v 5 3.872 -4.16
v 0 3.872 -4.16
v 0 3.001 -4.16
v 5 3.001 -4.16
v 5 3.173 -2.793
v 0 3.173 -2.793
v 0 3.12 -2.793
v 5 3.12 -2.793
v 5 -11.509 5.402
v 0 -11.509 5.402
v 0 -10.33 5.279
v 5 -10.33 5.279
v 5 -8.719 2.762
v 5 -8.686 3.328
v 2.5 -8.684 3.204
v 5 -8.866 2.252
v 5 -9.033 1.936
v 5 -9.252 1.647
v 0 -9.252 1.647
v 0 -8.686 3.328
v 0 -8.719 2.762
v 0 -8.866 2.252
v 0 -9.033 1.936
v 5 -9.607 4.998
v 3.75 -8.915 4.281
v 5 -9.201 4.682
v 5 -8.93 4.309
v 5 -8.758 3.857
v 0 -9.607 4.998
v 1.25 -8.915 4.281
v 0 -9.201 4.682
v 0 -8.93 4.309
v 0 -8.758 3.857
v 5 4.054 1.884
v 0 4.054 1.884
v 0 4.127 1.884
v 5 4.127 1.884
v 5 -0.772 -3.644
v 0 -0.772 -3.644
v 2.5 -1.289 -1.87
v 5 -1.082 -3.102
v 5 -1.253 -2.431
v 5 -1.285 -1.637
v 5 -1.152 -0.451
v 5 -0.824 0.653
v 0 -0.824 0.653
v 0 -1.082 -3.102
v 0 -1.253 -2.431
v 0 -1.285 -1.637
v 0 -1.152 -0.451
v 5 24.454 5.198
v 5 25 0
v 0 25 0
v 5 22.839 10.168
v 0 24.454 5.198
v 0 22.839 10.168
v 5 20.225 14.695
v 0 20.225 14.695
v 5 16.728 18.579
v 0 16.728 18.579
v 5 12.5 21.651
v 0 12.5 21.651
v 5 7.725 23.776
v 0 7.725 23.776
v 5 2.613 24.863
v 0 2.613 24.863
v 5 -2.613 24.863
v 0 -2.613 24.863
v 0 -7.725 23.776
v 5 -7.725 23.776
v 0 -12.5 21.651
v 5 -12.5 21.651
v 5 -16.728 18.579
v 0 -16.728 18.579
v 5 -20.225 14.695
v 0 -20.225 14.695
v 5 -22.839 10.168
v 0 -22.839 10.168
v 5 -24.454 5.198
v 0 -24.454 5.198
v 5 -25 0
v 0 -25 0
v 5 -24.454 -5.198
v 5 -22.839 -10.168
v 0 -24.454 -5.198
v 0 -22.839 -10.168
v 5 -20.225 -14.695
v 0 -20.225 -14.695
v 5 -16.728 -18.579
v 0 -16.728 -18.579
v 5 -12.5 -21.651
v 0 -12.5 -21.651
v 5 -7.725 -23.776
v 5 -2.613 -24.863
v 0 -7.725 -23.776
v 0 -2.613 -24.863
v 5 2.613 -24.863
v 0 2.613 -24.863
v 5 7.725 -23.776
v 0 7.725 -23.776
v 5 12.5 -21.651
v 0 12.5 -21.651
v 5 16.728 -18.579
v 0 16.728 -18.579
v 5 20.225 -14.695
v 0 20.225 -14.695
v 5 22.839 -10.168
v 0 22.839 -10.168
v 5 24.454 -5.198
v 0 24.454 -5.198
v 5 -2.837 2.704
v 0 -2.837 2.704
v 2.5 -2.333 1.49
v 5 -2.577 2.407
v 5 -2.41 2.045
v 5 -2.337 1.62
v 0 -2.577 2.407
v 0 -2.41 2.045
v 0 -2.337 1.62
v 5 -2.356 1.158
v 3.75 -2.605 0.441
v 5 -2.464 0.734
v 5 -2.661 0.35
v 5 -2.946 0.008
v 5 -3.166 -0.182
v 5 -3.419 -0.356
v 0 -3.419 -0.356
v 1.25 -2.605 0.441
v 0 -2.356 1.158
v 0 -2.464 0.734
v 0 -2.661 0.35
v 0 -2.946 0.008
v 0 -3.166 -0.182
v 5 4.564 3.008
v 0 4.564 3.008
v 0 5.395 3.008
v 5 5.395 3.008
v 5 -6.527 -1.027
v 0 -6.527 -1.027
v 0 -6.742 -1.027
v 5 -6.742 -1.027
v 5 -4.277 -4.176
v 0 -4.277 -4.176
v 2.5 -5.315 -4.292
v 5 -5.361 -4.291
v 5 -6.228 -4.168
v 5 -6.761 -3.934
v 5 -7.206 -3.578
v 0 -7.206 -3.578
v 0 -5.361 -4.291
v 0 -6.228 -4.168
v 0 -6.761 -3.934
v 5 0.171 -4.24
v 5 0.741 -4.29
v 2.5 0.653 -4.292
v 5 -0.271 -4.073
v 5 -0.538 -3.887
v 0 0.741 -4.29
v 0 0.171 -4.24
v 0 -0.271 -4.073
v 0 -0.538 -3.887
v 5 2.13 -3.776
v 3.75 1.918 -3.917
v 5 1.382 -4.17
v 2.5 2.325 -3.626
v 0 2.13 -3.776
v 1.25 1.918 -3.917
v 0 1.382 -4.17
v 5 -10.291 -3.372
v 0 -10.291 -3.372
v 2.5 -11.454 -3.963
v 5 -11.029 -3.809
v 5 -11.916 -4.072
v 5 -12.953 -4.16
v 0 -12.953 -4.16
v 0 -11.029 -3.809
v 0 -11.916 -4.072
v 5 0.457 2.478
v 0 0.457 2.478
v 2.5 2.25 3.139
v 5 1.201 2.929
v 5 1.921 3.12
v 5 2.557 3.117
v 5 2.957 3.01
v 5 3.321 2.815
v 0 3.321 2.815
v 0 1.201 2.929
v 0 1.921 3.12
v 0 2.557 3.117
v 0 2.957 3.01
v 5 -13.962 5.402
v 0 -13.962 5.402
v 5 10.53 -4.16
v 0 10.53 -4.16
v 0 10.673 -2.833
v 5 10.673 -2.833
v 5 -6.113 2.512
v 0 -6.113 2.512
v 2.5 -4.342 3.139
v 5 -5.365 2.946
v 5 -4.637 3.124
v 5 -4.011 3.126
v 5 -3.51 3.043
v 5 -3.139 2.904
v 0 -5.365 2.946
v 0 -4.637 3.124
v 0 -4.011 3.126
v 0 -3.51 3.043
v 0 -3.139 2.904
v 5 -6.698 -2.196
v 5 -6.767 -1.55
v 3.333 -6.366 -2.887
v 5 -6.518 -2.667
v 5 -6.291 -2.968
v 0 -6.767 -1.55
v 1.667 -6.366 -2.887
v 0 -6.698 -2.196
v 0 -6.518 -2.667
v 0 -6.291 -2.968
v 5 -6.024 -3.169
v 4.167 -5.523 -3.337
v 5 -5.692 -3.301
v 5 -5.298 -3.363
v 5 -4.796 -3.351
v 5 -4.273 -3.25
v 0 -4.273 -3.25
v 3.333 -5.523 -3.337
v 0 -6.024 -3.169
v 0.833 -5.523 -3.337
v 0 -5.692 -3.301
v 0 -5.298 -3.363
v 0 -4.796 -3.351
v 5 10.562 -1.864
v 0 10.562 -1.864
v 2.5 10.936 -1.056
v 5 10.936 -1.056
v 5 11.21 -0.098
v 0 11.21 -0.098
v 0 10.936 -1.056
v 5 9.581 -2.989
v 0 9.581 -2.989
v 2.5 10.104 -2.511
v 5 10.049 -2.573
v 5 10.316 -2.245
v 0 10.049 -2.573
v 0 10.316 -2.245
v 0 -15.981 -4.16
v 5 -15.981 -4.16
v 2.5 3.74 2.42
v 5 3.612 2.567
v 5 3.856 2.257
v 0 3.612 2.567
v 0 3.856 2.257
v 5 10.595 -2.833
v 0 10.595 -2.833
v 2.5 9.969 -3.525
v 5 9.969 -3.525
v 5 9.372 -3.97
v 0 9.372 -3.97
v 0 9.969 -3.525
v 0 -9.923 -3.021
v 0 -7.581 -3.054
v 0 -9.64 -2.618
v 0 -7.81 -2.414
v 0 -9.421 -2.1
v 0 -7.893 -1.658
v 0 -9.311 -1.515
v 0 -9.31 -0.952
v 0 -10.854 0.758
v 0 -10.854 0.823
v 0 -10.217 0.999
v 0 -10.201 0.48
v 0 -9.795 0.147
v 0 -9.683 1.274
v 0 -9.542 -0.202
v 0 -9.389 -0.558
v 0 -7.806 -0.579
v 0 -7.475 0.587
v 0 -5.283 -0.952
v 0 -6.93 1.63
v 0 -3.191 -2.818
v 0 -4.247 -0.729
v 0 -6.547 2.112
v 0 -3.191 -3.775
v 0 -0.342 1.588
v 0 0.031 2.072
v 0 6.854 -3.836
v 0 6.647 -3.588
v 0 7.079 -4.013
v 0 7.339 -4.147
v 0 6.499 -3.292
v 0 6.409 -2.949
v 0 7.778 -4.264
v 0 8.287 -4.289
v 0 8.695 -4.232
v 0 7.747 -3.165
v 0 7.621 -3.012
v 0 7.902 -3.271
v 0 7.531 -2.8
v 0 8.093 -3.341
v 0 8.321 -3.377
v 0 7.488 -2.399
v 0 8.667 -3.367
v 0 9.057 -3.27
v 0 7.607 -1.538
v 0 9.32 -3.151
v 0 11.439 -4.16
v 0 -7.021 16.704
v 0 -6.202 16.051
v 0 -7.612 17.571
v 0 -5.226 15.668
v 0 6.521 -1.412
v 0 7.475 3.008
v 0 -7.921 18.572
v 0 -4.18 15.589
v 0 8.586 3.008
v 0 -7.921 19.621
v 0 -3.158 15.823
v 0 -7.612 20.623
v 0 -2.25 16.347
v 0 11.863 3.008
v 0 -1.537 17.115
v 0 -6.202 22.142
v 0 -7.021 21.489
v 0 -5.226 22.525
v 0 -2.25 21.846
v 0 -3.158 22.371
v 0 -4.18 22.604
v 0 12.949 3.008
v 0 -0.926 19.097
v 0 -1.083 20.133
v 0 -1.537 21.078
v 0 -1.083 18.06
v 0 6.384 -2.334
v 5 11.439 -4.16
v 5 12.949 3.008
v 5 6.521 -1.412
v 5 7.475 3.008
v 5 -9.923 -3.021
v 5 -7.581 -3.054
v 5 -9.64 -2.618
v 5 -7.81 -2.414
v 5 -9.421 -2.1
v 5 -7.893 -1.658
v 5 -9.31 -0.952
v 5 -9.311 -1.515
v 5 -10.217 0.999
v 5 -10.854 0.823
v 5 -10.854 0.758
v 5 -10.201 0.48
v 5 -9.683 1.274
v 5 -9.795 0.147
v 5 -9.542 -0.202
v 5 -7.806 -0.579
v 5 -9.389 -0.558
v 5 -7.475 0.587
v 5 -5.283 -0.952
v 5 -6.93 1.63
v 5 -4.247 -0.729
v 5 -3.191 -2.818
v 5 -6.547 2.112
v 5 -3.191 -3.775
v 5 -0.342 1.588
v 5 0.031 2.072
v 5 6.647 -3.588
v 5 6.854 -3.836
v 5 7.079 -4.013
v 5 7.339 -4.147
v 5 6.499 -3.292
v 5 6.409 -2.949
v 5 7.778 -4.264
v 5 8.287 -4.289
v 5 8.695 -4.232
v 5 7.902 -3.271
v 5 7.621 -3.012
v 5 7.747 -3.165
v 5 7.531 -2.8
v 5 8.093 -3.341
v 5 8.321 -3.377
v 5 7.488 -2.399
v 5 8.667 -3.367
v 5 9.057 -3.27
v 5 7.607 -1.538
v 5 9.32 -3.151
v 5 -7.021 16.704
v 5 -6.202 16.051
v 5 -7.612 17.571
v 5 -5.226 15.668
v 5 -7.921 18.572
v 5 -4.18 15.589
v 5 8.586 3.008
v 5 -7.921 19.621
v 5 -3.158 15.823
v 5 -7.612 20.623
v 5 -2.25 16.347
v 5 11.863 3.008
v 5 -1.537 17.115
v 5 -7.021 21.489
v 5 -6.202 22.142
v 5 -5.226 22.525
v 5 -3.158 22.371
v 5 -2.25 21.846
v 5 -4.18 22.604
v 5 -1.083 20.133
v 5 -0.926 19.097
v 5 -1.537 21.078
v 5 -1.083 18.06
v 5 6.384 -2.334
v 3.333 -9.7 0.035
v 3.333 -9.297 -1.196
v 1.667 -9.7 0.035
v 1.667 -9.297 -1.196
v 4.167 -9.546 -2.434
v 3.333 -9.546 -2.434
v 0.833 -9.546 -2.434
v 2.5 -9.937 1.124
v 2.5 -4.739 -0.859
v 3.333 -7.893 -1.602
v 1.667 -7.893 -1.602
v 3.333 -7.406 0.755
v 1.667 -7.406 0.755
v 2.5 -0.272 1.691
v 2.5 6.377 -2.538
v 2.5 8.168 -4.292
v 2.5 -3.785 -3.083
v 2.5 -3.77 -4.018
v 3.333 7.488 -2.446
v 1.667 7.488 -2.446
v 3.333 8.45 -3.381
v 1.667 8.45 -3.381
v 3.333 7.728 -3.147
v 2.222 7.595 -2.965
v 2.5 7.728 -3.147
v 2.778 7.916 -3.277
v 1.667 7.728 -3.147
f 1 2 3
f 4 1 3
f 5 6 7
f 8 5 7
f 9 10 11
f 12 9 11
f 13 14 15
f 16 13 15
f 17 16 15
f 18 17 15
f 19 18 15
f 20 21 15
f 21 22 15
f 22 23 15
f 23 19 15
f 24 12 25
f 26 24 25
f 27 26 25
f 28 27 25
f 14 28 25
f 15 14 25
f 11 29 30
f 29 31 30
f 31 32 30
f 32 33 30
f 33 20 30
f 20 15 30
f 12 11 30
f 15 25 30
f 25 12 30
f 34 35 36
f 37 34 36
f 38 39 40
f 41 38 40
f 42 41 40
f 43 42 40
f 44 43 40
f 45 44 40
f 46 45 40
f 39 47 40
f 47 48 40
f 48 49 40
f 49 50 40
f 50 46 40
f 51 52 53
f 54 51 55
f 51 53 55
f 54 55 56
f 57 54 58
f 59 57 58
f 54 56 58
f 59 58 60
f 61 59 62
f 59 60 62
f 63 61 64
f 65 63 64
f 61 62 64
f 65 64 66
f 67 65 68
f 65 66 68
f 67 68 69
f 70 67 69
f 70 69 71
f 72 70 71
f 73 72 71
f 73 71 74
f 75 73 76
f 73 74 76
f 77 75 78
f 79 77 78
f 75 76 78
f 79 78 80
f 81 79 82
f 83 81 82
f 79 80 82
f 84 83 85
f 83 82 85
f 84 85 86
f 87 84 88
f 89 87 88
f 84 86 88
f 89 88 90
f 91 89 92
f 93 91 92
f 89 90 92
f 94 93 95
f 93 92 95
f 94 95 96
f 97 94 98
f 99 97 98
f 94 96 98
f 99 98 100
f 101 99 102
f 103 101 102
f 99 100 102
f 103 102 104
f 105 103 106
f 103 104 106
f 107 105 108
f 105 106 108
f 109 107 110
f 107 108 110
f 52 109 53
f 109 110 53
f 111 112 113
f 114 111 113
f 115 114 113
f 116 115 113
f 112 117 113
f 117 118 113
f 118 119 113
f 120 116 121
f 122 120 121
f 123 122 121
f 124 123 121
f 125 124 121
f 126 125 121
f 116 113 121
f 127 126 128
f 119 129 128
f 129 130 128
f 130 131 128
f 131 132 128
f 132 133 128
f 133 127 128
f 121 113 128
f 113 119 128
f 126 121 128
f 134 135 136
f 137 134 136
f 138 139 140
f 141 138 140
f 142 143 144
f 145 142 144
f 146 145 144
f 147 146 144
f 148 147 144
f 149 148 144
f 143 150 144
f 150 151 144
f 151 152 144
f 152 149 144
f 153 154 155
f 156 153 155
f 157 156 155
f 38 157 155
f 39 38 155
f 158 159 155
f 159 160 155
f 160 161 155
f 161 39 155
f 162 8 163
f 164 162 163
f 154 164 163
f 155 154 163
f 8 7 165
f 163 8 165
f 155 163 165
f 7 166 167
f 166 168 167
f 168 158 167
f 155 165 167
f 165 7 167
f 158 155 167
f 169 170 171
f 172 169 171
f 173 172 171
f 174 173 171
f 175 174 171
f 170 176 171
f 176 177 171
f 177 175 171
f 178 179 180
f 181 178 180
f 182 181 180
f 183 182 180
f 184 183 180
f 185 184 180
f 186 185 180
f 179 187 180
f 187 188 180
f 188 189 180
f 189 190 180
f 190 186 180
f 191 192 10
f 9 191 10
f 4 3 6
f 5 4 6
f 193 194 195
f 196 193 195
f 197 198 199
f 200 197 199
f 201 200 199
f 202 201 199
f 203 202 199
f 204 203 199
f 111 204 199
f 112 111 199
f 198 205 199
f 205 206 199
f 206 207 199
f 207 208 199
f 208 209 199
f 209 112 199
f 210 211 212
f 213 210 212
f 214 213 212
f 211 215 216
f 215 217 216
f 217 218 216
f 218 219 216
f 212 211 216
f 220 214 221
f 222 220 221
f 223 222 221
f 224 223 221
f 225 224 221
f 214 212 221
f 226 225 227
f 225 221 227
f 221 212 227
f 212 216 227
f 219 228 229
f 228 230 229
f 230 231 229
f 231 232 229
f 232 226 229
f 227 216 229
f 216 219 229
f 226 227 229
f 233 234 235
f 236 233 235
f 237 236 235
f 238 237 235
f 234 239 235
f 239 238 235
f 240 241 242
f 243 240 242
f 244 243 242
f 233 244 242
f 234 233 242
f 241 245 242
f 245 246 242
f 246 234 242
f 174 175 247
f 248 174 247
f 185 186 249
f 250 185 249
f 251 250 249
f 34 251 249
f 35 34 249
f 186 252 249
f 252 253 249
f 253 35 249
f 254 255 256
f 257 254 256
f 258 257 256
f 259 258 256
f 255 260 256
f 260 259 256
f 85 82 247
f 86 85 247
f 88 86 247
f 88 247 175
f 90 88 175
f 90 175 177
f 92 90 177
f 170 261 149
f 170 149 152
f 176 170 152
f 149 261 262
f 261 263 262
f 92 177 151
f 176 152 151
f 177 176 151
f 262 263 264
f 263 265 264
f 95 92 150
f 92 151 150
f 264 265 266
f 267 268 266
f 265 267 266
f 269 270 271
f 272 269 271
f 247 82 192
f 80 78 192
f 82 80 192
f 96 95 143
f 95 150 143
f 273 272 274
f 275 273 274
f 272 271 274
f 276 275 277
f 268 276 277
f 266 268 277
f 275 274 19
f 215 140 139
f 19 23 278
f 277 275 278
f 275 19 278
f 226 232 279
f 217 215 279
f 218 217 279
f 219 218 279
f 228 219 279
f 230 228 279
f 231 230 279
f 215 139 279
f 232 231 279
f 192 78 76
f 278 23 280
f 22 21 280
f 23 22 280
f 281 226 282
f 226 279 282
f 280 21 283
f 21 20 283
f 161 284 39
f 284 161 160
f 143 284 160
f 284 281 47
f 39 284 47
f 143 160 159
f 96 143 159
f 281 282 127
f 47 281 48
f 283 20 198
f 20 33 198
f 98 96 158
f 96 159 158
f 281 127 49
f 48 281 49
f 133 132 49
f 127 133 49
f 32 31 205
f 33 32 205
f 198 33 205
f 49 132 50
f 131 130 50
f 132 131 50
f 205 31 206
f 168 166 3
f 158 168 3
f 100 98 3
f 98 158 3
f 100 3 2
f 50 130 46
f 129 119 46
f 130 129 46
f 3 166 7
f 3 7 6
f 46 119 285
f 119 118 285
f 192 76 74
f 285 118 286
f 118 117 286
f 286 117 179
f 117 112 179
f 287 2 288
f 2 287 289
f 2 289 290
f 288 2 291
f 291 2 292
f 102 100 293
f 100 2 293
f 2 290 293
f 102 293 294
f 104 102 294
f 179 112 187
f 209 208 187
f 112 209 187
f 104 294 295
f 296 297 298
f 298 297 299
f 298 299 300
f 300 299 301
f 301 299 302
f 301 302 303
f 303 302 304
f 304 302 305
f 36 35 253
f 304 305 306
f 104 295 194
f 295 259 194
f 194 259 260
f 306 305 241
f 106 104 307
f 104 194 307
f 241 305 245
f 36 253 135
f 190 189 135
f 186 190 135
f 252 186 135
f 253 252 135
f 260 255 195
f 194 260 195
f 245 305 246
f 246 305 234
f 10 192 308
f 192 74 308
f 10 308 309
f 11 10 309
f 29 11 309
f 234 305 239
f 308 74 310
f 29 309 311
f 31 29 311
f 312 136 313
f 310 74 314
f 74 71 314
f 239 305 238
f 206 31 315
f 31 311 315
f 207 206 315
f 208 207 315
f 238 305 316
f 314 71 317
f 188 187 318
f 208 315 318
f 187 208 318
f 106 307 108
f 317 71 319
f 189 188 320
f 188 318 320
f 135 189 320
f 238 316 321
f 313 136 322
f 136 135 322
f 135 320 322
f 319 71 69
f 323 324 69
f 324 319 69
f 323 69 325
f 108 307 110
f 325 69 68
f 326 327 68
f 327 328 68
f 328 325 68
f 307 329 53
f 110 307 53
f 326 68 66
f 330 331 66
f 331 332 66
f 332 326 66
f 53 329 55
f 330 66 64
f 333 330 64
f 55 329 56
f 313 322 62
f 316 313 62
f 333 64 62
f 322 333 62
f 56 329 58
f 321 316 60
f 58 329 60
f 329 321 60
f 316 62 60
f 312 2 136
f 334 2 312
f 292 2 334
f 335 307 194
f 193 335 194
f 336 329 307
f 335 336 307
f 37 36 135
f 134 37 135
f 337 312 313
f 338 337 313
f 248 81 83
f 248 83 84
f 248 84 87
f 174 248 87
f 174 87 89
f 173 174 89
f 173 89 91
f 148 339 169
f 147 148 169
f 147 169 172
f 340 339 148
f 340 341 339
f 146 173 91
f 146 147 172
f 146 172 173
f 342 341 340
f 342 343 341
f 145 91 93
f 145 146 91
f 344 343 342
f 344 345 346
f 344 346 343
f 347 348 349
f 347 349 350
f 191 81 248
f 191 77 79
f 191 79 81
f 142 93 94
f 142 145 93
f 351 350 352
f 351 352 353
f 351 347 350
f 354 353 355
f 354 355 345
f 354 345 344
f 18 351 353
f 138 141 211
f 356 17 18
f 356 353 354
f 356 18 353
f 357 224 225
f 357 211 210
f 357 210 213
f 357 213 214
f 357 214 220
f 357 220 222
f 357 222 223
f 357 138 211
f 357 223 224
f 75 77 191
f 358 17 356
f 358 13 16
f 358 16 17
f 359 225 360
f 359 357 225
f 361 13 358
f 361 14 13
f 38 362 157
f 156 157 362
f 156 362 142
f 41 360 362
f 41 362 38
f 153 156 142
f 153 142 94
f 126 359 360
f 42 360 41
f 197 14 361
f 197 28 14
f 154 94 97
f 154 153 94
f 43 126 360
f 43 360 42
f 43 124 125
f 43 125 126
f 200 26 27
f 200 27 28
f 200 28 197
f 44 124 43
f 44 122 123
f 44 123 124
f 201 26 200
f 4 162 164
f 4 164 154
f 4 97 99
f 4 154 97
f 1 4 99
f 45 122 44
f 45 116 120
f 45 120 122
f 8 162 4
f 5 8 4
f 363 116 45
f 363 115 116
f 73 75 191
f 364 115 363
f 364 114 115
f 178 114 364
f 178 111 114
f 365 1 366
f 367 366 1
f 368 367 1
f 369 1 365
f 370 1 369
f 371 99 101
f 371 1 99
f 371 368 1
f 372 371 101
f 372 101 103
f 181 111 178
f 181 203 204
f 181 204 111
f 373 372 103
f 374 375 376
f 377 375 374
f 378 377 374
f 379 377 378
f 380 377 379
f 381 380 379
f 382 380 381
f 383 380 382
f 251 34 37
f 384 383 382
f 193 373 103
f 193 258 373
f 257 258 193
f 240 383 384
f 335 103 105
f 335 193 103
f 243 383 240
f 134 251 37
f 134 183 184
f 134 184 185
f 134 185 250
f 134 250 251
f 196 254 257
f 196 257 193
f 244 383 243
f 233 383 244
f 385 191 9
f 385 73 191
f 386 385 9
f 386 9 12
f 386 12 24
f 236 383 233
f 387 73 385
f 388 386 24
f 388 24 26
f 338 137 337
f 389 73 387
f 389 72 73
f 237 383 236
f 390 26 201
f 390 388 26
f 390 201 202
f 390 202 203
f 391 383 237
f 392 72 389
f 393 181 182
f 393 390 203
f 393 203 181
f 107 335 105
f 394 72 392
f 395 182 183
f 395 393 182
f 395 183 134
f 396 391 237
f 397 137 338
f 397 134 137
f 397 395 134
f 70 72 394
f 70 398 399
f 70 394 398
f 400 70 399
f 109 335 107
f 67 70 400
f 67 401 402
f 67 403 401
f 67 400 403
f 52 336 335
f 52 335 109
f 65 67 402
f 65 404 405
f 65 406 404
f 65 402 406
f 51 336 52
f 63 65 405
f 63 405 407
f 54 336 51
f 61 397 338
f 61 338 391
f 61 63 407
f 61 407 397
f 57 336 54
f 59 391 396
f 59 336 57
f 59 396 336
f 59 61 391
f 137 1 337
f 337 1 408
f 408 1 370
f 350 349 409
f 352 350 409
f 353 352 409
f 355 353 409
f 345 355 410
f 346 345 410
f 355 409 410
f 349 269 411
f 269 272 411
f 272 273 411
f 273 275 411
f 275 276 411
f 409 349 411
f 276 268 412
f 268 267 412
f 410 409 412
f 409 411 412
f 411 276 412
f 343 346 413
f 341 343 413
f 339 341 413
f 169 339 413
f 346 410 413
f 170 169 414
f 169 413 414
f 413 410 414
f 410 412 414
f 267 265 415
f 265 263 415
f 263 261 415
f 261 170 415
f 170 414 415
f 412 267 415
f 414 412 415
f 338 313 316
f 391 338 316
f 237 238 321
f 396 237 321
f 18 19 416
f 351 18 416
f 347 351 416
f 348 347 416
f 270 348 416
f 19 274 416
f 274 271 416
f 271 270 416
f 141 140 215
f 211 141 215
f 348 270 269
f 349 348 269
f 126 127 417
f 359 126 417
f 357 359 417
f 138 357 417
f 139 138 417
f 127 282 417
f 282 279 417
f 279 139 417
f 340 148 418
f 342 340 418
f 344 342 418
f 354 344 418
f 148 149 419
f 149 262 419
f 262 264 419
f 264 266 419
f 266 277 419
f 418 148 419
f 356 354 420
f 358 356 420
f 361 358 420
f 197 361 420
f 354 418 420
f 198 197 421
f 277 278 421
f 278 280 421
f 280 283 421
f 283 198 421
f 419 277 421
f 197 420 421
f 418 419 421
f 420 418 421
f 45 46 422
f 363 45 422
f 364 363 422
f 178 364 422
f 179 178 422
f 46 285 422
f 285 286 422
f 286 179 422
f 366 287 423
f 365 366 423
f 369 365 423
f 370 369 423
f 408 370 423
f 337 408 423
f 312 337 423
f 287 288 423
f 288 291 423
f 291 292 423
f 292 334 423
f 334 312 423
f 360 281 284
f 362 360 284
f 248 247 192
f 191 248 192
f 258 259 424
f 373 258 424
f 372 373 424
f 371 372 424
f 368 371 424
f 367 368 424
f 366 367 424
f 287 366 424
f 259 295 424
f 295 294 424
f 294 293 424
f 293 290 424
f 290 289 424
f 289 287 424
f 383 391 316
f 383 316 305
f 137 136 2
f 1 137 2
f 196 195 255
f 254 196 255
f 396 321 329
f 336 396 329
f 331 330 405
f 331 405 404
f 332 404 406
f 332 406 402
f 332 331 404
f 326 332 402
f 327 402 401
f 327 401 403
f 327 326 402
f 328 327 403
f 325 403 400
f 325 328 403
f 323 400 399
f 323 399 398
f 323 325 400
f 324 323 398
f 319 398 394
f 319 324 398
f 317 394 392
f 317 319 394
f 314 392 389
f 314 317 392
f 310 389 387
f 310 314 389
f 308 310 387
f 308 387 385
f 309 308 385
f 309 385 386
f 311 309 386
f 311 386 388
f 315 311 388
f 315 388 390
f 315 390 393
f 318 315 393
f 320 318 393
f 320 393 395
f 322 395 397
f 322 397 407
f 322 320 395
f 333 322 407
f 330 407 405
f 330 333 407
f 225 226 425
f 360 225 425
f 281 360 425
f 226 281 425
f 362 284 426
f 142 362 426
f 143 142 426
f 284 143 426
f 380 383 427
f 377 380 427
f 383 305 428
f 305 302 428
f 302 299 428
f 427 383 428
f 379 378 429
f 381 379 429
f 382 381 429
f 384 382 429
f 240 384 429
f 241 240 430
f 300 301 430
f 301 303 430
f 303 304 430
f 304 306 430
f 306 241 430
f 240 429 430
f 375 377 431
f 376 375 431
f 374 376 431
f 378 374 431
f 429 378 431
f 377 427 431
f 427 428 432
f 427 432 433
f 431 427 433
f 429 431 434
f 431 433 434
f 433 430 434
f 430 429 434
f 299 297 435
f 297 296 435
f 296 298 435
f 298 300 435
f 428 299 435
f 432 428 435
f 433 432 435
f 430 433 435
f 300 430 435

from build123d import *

# Parameters (mm, degrees)
F0_R     = 25
F0_R_2   = 3.517009594
F1_DEPTH = 5


with BuildPart() as f1:
    # F0 (on Right) → F1 (new body)
    with BuildSketch(Plane.YZ):
        Circle(F0_R)
        with BuildLine():
            add(Edge.make_bspline(
                [(-4.2770959996, -4.1764053417), (-4.7479386555, -4.2915002132), (-5.3150424766, -4.2915002132)],
                knots=[0, 0, 0, 1, 1, 1], degree=2))
            add(Edge.make_bspline(
                [(-5.3150424766, -4.2915002132), (-6.5183070416, -4.2915002132), (-7.2057373192, -3.5779120103)],
                knots=[0, 0, 0, 1, 1, 1], degree=2))
            add(Edge.make_bspline(
                [(-7.2057373192, -3.5779120103), (-7.8931675968, -2.8643238073), (-7.8931675968, -1.6024654896)],
                knots=[0, 0, 0, 1, 1, 1], degree=2))
            add(Edge.make_bspline(
                [(-7.8931675968, -1.6024654896), (-7.8931675968, -0.3740893162), (-7.4055838687, 0.7548867409)],
                knots=[0, 0, 0, 1, 1, 1], degree=2))
            add(Edge.make_bspline(
                [(-7.4055838687, 0.7548867409), (-6.9180001406, 1.883862798), (-6.1133823575, 2.5116530059)],
                knots=[0, 0, 0, 1, 1, 1], degree=2))
            add(Edge.make_bspline(
                [(-6.1133823575, 2.5116530059), (-5.3087645745, 3.1394432137), (-4.3419676544, 3.1394432137)],
                knots=[0, 0, 0, 1, 1, 1], degree=2))
            add(Edge.make_bspline(
                [(-4.3419676544, 3.1394432137), (-3.3416885899, 3.1394432137), (-2.8373637896, 2.7041753363)],
                knots=[0, 0, 0, 1, 1, 1], degree=2))
            add(Edge.make_bspline(
                [(-2.8373637896, 2.7041753363), (-2.3330389893, 2.2689074588), (-2.3330389893, 1.4904476011)],
                knots=[0, 0, 0, 1, 1, 1], degree=2))
            add(Edge.make_bspline(
                [(-2.3330389893, 1.4904476011), (-2.3330389893, 0.3143872784), (-3.4191160489, -0.356301927)],
                knots=[0, 0, 0, 1, 1, 1], degree=2))
            add(Edge.make_bspline(
                [(-3.4191160489, -0.356301927), (-4.5051931084, -1.0269911324), (-6.5266775777, -1.0269911324)],
                knots=[0, 0, 0, 1, 1, 1], degree=2))
            Line((-6.5266775777, -1.0269911324), (-6.7422188824, -1.0269911324))
            Line((-6.7422188824, -1.0269911324), (-6.7673304907, -1.5501496389))
            add(Edge.make_bspline(
                [(-6.7673304907, -1.5501496389), (-6.7673304907, -2.4060369556), (-6.3655447577, -2.8873427816)],
                knots=[0, 0, 0, 1, 1, 1], degree=2))
            add(Edge.make_bspline(
                [(-6.3655447577, -2.8873427816), (-5.9637590247, -3.3686486076), (-5.1204275121, -3.3686486076)],
                knots=[0, 0, 0, 1, 1, 1], degree=2))
            add(Edge.make_bspline(
                [(-5.1204275121, -3.3686486076), (-4.708178609, -3.3686486076), (-4.2729107315, -3.2504147852)],
                knots=[0, 0, 0, 1, 1, 1], degree=2))
            add(Edge.make_bspline(
                [(-4.2729107315, -3.2504147852), (-3.8376428541, -3.1321809627), (-3.19101894, -2.8182858588)],
                knots=[0, 0, 0, 1, 1, 1], degree=2))
            Line((-3.19101894, -2.8182858588), (-3.19101894, -3.7746196087))
            add(Edge.make_bspline(
                [(-3.19101894, -3.7746196087), (-3.8062533437, -4.0613104703), (-4.2770959996, -4.1764053417)],
                knots=[0, 0, 0, 1, 1, 1], degree=2))
        make_face(mode=Mode.SUBTRACT)
        with BuildLine():
            add(Edge.make_bspline(
                [(0.4574884846, 2.4781708614), (1.2746620718, 3.1394432137), (2.249829528, 3.1394432137)],
                knots=[0, 0, 0, 1, 1, 1], degree=2))
            add(Edge.make_bspline(
                [(2.249829528, 3.1394432137), (2.8504154935, 3.1394432137), (3.3212581494, 2.8150849397)],
                knots=[0, 0, 0, 1, 1, 1], degree=2))
            add(Edge.make_bspline(
                [(3.3212581494, 2.8150849397), (3.7921008053, 2.4907266656), (4.0536800586, 1.883862798)],
                knots=[0, 0, 0, 1, 1, 1], degree=2))
            Line((4.0536800586, 1.883862798), (4.1269222495, 1.883862798))
            Line((4.1269222495, 1.883862798), (4.5642827609, 3.0076072701))
            Line((4.5642827609, 3.0076072701), (5.3950584693, 3.0076072701))
            Line((5.3950584693, 3.0076072701), (3.8716208983, -4.1596642695))
            Line((3.8716208983, -4.1596642695), (3.0010851434, -4.1596642695))
            Line((3.0010851434, -4.1596642695), (3.1726811335, -2.7931742505))
            Line((3.1726811335, -2.7931742505), (3.1203652829, -2.7931742505))
            add(Edge.make_bspline(
                [(3.1203652829, -2.7931742505), (1.9484902282, -4.2915002132), (0.653149766, -4.2915002132)],
                knots=[0, 0, 0, 1, 1, 1], degree=2))
            add(Edge.make_bspline(
                [(0.653149766, -4.2915002132), (-0.2550534013, -4.2915002132), (-0.7719340058, -3.6438299821)],
                knots=[0, 0, 0, 1, 1, 1], degree=2))
            add(Edge.make_bspline(
                [(-0.7719340058, -3.6438299821), (-1.2888146102, -2.996159751), (-1.2888146102, -1.8703226449)],
                knots=[0, 0, 0, 1, 1, 1], degree=2))
            add(Edge.make_bspline(
                [(-1.2888146102, -1.8703226449), (-1.2888146102, -0.5101105279), (-0.8242498564, 0.6533939906)],
                knots=[0, 0, 0, 1, 1, 1], degree=2))
            add(Edge.make_bspline(
                [(-0.8242498564, 0.6533939906), (-0.3596851026, 1.8168985092), (0.4574884846, 2.4781708614)],
                knots=[0, 0, 0, 1, 1, 1], degree=2))
        make_face(mode=Mode.SUBTRACT)
        with BuildLine():
            Line((7.4751366913, 3.0076072701), (8.5863253592, 3.0076072701))
            Line((8.5863253592, 3.0076072701), (7.606972635, -1.5375938348))
            add(Edge.make_bspline(
                [(7.606972635, -1.5375938348), (7.4876924955, -2.119346094), (7.4876924955, -2.4457970021)],
                knots=[0, 0, 0, 1, 1, 1], degree=2))
            add(Edge.make_bspline(
                [(7.4876924955, -2.4457970021), (7.4876924955, -3.3812044118), (8.4503041475, -3.3812044118)],
                knots=[0, 0, 0, 1, 1, 1], degree=2))
            add(Edge.make_bspline(
                [(8.4503041475, -3.3812044118), (9.0257785047, -3.3812044118), (9.5813728387, -2.9888355319)],
                knots=[0, 0, 0, 1, 1, 1], degree=2))
            add(Edge.make_bspline(
                [(9.5813728387, -2.9888355319), (10.1369671726, -2.596466652), (10.5617718799, -1.8640447428)],
                knots=[0, 0, 0, 1, 1, 1], degree=2))
            add(Edge.make_bspline(
                [(10.5617718799, -1.8640447428), (10.9865765872, -1.1316228337), (11.210488428, -0.0978616248)],
                knots=[0, 0, 0, 1, 1, 1], degree=2))
            Line((11.210488428, -0.0978616248), (11.8633902442, 3.0076072701))
            Line((11.8633902442, 3.0076072701), (12.9494673038, 3.0076072701))
            Line((12.9494673038, 3.0076072701), (11.4385855369, -4.1596642695))
            Line((11.4385855369, -4.1596642695), (10.5303823695, -4.1596642695))
            Line((10.5303823695, -4.1596642695), (10.6726814833, -2.832934297))
            Line((10.6726814833, -2.832934297), (10.5952540243, -2.832934297))
            add(Edge.make_bspline(
                [(10.5952540243, -2.832934297), (9.9549080123, -3.6490615672), (9.372109436, -3.9702808902)],
                knots=[0, 0, 0, 1, 1, 1], degree=2))
            add(Edge.make_bspline(
                [(9.372109436, -3.9702808902), (8.7893108598, -4.2915002132), (8.167798554, -4.2915002132)],
                knots=[0, 0, 0, 1, 1, 1], degree=2))
            add(Edge.make_bspline(
                [(8.167798554, -4.2915002132), (7.3307449435, -4.2915002132), (6.8536243856, -3.8363523125)],
                knots=[0, 0, 0, 1, 1, 1], degree=2))
            add(Edge.make_bspline(
                [(6.8536243856, -3.8363523125), (6.3765038276, -3.3812044118), (6.3765038276, -2.5378728993)],
                knots=[0, 0, 0, 1, 1, 1], degree=2))
            add(Edge.make_bspline(
                [(6.3765038276, -2.5378728993), (6.3765038276, -2.1319018982), (6.5208955754, -1.4120357932)],
                knots=[0, 0, 0, 1, 1, 1], degree=2))
            Line((6.5208955754, -1.4120357932), (7.4751366913, 3.0076072701))
        make_face(mode=Mode.SUBTRACT)
        with BuildLine():
            Line((-13.9618062727, 5.401580596), (-11.509239194, 5.401580596))
            add(Edge.make_bspline(
                [(-11.509239194, 5.401580596), (-8.6841832587, 5.401580596), (-8.6841832587, 3.2043148685)],
                knots=[0, 0, 0, 1, 1, 1], degree=2))
            add(Edge.make_bspline(
                [(-8.6841832587, 3.2043148685), (-8.6841832587, 2.281463263), (-9.2523333968, 1.6473951531)],
                knots=[0, 0, 0, 1, 1, 1], degree=2))
            add(Edge.make_bspline(
                [(-9.2523333968, 1.6473951531), (-9.8204835349, 1.0133270431), (-10.8542447438, 0.8228973468)],
                knots=[0, 0, 0, 1, 1, 1], degree=2))
            Line((-10.8542447438, 0.8228973468), (-10.8542447438, 0.7580256919))
            add(Edge.make_bspline(
                [(-10.8542447438, 0.7580256919), (-10.1029891284, 0.5487622893), (-9.7001570784, 0.0350206359)],
                knots=[0, 0, 0, 1, 1, 1], degree=2))
            add(Edge.make_bspline(
                [(-9.7001570784, 0.0350206359), (-9.2973250284, -0.4787210175), (-9.2973250284, -1.1964944885)],
                knots=[0, 0, 0, 1, 1, 1], degree=2))
            add(Edge.make_bspline(
                [(-9.2973250284, -1.1964944885), (-9.2973250284, -2.5839108478), (-10.2913261908, -3.3717875587)],
                knots=[0, 0, 0, 1, 1, 1], degree=2))
            add(Edge.make_bspline(
                [(-10.2913261908, -3.3717875587), (-11.2853273532, -4.1596642695), (-12.9531566721, -4.1596642695)],
                knots=[0, 0, 0, 1, 1, 1], degree=2))
            Line((-12.9531566721, -4.1596642695), (-15.9811981079, -4.1596642695))
            Line((-15.9811981079, -4.1596642695), (-13.9618062727, 5.401580596))
        make_face(mode=Mode.SUBTRACT)
        with Locations((-4.4432776049, 19.0966390073)):
            Circle(F0_R_2, mode=Mode.SUBTRACT)
    extrude(amount=F1_DEPTH)


solid = f1.part
